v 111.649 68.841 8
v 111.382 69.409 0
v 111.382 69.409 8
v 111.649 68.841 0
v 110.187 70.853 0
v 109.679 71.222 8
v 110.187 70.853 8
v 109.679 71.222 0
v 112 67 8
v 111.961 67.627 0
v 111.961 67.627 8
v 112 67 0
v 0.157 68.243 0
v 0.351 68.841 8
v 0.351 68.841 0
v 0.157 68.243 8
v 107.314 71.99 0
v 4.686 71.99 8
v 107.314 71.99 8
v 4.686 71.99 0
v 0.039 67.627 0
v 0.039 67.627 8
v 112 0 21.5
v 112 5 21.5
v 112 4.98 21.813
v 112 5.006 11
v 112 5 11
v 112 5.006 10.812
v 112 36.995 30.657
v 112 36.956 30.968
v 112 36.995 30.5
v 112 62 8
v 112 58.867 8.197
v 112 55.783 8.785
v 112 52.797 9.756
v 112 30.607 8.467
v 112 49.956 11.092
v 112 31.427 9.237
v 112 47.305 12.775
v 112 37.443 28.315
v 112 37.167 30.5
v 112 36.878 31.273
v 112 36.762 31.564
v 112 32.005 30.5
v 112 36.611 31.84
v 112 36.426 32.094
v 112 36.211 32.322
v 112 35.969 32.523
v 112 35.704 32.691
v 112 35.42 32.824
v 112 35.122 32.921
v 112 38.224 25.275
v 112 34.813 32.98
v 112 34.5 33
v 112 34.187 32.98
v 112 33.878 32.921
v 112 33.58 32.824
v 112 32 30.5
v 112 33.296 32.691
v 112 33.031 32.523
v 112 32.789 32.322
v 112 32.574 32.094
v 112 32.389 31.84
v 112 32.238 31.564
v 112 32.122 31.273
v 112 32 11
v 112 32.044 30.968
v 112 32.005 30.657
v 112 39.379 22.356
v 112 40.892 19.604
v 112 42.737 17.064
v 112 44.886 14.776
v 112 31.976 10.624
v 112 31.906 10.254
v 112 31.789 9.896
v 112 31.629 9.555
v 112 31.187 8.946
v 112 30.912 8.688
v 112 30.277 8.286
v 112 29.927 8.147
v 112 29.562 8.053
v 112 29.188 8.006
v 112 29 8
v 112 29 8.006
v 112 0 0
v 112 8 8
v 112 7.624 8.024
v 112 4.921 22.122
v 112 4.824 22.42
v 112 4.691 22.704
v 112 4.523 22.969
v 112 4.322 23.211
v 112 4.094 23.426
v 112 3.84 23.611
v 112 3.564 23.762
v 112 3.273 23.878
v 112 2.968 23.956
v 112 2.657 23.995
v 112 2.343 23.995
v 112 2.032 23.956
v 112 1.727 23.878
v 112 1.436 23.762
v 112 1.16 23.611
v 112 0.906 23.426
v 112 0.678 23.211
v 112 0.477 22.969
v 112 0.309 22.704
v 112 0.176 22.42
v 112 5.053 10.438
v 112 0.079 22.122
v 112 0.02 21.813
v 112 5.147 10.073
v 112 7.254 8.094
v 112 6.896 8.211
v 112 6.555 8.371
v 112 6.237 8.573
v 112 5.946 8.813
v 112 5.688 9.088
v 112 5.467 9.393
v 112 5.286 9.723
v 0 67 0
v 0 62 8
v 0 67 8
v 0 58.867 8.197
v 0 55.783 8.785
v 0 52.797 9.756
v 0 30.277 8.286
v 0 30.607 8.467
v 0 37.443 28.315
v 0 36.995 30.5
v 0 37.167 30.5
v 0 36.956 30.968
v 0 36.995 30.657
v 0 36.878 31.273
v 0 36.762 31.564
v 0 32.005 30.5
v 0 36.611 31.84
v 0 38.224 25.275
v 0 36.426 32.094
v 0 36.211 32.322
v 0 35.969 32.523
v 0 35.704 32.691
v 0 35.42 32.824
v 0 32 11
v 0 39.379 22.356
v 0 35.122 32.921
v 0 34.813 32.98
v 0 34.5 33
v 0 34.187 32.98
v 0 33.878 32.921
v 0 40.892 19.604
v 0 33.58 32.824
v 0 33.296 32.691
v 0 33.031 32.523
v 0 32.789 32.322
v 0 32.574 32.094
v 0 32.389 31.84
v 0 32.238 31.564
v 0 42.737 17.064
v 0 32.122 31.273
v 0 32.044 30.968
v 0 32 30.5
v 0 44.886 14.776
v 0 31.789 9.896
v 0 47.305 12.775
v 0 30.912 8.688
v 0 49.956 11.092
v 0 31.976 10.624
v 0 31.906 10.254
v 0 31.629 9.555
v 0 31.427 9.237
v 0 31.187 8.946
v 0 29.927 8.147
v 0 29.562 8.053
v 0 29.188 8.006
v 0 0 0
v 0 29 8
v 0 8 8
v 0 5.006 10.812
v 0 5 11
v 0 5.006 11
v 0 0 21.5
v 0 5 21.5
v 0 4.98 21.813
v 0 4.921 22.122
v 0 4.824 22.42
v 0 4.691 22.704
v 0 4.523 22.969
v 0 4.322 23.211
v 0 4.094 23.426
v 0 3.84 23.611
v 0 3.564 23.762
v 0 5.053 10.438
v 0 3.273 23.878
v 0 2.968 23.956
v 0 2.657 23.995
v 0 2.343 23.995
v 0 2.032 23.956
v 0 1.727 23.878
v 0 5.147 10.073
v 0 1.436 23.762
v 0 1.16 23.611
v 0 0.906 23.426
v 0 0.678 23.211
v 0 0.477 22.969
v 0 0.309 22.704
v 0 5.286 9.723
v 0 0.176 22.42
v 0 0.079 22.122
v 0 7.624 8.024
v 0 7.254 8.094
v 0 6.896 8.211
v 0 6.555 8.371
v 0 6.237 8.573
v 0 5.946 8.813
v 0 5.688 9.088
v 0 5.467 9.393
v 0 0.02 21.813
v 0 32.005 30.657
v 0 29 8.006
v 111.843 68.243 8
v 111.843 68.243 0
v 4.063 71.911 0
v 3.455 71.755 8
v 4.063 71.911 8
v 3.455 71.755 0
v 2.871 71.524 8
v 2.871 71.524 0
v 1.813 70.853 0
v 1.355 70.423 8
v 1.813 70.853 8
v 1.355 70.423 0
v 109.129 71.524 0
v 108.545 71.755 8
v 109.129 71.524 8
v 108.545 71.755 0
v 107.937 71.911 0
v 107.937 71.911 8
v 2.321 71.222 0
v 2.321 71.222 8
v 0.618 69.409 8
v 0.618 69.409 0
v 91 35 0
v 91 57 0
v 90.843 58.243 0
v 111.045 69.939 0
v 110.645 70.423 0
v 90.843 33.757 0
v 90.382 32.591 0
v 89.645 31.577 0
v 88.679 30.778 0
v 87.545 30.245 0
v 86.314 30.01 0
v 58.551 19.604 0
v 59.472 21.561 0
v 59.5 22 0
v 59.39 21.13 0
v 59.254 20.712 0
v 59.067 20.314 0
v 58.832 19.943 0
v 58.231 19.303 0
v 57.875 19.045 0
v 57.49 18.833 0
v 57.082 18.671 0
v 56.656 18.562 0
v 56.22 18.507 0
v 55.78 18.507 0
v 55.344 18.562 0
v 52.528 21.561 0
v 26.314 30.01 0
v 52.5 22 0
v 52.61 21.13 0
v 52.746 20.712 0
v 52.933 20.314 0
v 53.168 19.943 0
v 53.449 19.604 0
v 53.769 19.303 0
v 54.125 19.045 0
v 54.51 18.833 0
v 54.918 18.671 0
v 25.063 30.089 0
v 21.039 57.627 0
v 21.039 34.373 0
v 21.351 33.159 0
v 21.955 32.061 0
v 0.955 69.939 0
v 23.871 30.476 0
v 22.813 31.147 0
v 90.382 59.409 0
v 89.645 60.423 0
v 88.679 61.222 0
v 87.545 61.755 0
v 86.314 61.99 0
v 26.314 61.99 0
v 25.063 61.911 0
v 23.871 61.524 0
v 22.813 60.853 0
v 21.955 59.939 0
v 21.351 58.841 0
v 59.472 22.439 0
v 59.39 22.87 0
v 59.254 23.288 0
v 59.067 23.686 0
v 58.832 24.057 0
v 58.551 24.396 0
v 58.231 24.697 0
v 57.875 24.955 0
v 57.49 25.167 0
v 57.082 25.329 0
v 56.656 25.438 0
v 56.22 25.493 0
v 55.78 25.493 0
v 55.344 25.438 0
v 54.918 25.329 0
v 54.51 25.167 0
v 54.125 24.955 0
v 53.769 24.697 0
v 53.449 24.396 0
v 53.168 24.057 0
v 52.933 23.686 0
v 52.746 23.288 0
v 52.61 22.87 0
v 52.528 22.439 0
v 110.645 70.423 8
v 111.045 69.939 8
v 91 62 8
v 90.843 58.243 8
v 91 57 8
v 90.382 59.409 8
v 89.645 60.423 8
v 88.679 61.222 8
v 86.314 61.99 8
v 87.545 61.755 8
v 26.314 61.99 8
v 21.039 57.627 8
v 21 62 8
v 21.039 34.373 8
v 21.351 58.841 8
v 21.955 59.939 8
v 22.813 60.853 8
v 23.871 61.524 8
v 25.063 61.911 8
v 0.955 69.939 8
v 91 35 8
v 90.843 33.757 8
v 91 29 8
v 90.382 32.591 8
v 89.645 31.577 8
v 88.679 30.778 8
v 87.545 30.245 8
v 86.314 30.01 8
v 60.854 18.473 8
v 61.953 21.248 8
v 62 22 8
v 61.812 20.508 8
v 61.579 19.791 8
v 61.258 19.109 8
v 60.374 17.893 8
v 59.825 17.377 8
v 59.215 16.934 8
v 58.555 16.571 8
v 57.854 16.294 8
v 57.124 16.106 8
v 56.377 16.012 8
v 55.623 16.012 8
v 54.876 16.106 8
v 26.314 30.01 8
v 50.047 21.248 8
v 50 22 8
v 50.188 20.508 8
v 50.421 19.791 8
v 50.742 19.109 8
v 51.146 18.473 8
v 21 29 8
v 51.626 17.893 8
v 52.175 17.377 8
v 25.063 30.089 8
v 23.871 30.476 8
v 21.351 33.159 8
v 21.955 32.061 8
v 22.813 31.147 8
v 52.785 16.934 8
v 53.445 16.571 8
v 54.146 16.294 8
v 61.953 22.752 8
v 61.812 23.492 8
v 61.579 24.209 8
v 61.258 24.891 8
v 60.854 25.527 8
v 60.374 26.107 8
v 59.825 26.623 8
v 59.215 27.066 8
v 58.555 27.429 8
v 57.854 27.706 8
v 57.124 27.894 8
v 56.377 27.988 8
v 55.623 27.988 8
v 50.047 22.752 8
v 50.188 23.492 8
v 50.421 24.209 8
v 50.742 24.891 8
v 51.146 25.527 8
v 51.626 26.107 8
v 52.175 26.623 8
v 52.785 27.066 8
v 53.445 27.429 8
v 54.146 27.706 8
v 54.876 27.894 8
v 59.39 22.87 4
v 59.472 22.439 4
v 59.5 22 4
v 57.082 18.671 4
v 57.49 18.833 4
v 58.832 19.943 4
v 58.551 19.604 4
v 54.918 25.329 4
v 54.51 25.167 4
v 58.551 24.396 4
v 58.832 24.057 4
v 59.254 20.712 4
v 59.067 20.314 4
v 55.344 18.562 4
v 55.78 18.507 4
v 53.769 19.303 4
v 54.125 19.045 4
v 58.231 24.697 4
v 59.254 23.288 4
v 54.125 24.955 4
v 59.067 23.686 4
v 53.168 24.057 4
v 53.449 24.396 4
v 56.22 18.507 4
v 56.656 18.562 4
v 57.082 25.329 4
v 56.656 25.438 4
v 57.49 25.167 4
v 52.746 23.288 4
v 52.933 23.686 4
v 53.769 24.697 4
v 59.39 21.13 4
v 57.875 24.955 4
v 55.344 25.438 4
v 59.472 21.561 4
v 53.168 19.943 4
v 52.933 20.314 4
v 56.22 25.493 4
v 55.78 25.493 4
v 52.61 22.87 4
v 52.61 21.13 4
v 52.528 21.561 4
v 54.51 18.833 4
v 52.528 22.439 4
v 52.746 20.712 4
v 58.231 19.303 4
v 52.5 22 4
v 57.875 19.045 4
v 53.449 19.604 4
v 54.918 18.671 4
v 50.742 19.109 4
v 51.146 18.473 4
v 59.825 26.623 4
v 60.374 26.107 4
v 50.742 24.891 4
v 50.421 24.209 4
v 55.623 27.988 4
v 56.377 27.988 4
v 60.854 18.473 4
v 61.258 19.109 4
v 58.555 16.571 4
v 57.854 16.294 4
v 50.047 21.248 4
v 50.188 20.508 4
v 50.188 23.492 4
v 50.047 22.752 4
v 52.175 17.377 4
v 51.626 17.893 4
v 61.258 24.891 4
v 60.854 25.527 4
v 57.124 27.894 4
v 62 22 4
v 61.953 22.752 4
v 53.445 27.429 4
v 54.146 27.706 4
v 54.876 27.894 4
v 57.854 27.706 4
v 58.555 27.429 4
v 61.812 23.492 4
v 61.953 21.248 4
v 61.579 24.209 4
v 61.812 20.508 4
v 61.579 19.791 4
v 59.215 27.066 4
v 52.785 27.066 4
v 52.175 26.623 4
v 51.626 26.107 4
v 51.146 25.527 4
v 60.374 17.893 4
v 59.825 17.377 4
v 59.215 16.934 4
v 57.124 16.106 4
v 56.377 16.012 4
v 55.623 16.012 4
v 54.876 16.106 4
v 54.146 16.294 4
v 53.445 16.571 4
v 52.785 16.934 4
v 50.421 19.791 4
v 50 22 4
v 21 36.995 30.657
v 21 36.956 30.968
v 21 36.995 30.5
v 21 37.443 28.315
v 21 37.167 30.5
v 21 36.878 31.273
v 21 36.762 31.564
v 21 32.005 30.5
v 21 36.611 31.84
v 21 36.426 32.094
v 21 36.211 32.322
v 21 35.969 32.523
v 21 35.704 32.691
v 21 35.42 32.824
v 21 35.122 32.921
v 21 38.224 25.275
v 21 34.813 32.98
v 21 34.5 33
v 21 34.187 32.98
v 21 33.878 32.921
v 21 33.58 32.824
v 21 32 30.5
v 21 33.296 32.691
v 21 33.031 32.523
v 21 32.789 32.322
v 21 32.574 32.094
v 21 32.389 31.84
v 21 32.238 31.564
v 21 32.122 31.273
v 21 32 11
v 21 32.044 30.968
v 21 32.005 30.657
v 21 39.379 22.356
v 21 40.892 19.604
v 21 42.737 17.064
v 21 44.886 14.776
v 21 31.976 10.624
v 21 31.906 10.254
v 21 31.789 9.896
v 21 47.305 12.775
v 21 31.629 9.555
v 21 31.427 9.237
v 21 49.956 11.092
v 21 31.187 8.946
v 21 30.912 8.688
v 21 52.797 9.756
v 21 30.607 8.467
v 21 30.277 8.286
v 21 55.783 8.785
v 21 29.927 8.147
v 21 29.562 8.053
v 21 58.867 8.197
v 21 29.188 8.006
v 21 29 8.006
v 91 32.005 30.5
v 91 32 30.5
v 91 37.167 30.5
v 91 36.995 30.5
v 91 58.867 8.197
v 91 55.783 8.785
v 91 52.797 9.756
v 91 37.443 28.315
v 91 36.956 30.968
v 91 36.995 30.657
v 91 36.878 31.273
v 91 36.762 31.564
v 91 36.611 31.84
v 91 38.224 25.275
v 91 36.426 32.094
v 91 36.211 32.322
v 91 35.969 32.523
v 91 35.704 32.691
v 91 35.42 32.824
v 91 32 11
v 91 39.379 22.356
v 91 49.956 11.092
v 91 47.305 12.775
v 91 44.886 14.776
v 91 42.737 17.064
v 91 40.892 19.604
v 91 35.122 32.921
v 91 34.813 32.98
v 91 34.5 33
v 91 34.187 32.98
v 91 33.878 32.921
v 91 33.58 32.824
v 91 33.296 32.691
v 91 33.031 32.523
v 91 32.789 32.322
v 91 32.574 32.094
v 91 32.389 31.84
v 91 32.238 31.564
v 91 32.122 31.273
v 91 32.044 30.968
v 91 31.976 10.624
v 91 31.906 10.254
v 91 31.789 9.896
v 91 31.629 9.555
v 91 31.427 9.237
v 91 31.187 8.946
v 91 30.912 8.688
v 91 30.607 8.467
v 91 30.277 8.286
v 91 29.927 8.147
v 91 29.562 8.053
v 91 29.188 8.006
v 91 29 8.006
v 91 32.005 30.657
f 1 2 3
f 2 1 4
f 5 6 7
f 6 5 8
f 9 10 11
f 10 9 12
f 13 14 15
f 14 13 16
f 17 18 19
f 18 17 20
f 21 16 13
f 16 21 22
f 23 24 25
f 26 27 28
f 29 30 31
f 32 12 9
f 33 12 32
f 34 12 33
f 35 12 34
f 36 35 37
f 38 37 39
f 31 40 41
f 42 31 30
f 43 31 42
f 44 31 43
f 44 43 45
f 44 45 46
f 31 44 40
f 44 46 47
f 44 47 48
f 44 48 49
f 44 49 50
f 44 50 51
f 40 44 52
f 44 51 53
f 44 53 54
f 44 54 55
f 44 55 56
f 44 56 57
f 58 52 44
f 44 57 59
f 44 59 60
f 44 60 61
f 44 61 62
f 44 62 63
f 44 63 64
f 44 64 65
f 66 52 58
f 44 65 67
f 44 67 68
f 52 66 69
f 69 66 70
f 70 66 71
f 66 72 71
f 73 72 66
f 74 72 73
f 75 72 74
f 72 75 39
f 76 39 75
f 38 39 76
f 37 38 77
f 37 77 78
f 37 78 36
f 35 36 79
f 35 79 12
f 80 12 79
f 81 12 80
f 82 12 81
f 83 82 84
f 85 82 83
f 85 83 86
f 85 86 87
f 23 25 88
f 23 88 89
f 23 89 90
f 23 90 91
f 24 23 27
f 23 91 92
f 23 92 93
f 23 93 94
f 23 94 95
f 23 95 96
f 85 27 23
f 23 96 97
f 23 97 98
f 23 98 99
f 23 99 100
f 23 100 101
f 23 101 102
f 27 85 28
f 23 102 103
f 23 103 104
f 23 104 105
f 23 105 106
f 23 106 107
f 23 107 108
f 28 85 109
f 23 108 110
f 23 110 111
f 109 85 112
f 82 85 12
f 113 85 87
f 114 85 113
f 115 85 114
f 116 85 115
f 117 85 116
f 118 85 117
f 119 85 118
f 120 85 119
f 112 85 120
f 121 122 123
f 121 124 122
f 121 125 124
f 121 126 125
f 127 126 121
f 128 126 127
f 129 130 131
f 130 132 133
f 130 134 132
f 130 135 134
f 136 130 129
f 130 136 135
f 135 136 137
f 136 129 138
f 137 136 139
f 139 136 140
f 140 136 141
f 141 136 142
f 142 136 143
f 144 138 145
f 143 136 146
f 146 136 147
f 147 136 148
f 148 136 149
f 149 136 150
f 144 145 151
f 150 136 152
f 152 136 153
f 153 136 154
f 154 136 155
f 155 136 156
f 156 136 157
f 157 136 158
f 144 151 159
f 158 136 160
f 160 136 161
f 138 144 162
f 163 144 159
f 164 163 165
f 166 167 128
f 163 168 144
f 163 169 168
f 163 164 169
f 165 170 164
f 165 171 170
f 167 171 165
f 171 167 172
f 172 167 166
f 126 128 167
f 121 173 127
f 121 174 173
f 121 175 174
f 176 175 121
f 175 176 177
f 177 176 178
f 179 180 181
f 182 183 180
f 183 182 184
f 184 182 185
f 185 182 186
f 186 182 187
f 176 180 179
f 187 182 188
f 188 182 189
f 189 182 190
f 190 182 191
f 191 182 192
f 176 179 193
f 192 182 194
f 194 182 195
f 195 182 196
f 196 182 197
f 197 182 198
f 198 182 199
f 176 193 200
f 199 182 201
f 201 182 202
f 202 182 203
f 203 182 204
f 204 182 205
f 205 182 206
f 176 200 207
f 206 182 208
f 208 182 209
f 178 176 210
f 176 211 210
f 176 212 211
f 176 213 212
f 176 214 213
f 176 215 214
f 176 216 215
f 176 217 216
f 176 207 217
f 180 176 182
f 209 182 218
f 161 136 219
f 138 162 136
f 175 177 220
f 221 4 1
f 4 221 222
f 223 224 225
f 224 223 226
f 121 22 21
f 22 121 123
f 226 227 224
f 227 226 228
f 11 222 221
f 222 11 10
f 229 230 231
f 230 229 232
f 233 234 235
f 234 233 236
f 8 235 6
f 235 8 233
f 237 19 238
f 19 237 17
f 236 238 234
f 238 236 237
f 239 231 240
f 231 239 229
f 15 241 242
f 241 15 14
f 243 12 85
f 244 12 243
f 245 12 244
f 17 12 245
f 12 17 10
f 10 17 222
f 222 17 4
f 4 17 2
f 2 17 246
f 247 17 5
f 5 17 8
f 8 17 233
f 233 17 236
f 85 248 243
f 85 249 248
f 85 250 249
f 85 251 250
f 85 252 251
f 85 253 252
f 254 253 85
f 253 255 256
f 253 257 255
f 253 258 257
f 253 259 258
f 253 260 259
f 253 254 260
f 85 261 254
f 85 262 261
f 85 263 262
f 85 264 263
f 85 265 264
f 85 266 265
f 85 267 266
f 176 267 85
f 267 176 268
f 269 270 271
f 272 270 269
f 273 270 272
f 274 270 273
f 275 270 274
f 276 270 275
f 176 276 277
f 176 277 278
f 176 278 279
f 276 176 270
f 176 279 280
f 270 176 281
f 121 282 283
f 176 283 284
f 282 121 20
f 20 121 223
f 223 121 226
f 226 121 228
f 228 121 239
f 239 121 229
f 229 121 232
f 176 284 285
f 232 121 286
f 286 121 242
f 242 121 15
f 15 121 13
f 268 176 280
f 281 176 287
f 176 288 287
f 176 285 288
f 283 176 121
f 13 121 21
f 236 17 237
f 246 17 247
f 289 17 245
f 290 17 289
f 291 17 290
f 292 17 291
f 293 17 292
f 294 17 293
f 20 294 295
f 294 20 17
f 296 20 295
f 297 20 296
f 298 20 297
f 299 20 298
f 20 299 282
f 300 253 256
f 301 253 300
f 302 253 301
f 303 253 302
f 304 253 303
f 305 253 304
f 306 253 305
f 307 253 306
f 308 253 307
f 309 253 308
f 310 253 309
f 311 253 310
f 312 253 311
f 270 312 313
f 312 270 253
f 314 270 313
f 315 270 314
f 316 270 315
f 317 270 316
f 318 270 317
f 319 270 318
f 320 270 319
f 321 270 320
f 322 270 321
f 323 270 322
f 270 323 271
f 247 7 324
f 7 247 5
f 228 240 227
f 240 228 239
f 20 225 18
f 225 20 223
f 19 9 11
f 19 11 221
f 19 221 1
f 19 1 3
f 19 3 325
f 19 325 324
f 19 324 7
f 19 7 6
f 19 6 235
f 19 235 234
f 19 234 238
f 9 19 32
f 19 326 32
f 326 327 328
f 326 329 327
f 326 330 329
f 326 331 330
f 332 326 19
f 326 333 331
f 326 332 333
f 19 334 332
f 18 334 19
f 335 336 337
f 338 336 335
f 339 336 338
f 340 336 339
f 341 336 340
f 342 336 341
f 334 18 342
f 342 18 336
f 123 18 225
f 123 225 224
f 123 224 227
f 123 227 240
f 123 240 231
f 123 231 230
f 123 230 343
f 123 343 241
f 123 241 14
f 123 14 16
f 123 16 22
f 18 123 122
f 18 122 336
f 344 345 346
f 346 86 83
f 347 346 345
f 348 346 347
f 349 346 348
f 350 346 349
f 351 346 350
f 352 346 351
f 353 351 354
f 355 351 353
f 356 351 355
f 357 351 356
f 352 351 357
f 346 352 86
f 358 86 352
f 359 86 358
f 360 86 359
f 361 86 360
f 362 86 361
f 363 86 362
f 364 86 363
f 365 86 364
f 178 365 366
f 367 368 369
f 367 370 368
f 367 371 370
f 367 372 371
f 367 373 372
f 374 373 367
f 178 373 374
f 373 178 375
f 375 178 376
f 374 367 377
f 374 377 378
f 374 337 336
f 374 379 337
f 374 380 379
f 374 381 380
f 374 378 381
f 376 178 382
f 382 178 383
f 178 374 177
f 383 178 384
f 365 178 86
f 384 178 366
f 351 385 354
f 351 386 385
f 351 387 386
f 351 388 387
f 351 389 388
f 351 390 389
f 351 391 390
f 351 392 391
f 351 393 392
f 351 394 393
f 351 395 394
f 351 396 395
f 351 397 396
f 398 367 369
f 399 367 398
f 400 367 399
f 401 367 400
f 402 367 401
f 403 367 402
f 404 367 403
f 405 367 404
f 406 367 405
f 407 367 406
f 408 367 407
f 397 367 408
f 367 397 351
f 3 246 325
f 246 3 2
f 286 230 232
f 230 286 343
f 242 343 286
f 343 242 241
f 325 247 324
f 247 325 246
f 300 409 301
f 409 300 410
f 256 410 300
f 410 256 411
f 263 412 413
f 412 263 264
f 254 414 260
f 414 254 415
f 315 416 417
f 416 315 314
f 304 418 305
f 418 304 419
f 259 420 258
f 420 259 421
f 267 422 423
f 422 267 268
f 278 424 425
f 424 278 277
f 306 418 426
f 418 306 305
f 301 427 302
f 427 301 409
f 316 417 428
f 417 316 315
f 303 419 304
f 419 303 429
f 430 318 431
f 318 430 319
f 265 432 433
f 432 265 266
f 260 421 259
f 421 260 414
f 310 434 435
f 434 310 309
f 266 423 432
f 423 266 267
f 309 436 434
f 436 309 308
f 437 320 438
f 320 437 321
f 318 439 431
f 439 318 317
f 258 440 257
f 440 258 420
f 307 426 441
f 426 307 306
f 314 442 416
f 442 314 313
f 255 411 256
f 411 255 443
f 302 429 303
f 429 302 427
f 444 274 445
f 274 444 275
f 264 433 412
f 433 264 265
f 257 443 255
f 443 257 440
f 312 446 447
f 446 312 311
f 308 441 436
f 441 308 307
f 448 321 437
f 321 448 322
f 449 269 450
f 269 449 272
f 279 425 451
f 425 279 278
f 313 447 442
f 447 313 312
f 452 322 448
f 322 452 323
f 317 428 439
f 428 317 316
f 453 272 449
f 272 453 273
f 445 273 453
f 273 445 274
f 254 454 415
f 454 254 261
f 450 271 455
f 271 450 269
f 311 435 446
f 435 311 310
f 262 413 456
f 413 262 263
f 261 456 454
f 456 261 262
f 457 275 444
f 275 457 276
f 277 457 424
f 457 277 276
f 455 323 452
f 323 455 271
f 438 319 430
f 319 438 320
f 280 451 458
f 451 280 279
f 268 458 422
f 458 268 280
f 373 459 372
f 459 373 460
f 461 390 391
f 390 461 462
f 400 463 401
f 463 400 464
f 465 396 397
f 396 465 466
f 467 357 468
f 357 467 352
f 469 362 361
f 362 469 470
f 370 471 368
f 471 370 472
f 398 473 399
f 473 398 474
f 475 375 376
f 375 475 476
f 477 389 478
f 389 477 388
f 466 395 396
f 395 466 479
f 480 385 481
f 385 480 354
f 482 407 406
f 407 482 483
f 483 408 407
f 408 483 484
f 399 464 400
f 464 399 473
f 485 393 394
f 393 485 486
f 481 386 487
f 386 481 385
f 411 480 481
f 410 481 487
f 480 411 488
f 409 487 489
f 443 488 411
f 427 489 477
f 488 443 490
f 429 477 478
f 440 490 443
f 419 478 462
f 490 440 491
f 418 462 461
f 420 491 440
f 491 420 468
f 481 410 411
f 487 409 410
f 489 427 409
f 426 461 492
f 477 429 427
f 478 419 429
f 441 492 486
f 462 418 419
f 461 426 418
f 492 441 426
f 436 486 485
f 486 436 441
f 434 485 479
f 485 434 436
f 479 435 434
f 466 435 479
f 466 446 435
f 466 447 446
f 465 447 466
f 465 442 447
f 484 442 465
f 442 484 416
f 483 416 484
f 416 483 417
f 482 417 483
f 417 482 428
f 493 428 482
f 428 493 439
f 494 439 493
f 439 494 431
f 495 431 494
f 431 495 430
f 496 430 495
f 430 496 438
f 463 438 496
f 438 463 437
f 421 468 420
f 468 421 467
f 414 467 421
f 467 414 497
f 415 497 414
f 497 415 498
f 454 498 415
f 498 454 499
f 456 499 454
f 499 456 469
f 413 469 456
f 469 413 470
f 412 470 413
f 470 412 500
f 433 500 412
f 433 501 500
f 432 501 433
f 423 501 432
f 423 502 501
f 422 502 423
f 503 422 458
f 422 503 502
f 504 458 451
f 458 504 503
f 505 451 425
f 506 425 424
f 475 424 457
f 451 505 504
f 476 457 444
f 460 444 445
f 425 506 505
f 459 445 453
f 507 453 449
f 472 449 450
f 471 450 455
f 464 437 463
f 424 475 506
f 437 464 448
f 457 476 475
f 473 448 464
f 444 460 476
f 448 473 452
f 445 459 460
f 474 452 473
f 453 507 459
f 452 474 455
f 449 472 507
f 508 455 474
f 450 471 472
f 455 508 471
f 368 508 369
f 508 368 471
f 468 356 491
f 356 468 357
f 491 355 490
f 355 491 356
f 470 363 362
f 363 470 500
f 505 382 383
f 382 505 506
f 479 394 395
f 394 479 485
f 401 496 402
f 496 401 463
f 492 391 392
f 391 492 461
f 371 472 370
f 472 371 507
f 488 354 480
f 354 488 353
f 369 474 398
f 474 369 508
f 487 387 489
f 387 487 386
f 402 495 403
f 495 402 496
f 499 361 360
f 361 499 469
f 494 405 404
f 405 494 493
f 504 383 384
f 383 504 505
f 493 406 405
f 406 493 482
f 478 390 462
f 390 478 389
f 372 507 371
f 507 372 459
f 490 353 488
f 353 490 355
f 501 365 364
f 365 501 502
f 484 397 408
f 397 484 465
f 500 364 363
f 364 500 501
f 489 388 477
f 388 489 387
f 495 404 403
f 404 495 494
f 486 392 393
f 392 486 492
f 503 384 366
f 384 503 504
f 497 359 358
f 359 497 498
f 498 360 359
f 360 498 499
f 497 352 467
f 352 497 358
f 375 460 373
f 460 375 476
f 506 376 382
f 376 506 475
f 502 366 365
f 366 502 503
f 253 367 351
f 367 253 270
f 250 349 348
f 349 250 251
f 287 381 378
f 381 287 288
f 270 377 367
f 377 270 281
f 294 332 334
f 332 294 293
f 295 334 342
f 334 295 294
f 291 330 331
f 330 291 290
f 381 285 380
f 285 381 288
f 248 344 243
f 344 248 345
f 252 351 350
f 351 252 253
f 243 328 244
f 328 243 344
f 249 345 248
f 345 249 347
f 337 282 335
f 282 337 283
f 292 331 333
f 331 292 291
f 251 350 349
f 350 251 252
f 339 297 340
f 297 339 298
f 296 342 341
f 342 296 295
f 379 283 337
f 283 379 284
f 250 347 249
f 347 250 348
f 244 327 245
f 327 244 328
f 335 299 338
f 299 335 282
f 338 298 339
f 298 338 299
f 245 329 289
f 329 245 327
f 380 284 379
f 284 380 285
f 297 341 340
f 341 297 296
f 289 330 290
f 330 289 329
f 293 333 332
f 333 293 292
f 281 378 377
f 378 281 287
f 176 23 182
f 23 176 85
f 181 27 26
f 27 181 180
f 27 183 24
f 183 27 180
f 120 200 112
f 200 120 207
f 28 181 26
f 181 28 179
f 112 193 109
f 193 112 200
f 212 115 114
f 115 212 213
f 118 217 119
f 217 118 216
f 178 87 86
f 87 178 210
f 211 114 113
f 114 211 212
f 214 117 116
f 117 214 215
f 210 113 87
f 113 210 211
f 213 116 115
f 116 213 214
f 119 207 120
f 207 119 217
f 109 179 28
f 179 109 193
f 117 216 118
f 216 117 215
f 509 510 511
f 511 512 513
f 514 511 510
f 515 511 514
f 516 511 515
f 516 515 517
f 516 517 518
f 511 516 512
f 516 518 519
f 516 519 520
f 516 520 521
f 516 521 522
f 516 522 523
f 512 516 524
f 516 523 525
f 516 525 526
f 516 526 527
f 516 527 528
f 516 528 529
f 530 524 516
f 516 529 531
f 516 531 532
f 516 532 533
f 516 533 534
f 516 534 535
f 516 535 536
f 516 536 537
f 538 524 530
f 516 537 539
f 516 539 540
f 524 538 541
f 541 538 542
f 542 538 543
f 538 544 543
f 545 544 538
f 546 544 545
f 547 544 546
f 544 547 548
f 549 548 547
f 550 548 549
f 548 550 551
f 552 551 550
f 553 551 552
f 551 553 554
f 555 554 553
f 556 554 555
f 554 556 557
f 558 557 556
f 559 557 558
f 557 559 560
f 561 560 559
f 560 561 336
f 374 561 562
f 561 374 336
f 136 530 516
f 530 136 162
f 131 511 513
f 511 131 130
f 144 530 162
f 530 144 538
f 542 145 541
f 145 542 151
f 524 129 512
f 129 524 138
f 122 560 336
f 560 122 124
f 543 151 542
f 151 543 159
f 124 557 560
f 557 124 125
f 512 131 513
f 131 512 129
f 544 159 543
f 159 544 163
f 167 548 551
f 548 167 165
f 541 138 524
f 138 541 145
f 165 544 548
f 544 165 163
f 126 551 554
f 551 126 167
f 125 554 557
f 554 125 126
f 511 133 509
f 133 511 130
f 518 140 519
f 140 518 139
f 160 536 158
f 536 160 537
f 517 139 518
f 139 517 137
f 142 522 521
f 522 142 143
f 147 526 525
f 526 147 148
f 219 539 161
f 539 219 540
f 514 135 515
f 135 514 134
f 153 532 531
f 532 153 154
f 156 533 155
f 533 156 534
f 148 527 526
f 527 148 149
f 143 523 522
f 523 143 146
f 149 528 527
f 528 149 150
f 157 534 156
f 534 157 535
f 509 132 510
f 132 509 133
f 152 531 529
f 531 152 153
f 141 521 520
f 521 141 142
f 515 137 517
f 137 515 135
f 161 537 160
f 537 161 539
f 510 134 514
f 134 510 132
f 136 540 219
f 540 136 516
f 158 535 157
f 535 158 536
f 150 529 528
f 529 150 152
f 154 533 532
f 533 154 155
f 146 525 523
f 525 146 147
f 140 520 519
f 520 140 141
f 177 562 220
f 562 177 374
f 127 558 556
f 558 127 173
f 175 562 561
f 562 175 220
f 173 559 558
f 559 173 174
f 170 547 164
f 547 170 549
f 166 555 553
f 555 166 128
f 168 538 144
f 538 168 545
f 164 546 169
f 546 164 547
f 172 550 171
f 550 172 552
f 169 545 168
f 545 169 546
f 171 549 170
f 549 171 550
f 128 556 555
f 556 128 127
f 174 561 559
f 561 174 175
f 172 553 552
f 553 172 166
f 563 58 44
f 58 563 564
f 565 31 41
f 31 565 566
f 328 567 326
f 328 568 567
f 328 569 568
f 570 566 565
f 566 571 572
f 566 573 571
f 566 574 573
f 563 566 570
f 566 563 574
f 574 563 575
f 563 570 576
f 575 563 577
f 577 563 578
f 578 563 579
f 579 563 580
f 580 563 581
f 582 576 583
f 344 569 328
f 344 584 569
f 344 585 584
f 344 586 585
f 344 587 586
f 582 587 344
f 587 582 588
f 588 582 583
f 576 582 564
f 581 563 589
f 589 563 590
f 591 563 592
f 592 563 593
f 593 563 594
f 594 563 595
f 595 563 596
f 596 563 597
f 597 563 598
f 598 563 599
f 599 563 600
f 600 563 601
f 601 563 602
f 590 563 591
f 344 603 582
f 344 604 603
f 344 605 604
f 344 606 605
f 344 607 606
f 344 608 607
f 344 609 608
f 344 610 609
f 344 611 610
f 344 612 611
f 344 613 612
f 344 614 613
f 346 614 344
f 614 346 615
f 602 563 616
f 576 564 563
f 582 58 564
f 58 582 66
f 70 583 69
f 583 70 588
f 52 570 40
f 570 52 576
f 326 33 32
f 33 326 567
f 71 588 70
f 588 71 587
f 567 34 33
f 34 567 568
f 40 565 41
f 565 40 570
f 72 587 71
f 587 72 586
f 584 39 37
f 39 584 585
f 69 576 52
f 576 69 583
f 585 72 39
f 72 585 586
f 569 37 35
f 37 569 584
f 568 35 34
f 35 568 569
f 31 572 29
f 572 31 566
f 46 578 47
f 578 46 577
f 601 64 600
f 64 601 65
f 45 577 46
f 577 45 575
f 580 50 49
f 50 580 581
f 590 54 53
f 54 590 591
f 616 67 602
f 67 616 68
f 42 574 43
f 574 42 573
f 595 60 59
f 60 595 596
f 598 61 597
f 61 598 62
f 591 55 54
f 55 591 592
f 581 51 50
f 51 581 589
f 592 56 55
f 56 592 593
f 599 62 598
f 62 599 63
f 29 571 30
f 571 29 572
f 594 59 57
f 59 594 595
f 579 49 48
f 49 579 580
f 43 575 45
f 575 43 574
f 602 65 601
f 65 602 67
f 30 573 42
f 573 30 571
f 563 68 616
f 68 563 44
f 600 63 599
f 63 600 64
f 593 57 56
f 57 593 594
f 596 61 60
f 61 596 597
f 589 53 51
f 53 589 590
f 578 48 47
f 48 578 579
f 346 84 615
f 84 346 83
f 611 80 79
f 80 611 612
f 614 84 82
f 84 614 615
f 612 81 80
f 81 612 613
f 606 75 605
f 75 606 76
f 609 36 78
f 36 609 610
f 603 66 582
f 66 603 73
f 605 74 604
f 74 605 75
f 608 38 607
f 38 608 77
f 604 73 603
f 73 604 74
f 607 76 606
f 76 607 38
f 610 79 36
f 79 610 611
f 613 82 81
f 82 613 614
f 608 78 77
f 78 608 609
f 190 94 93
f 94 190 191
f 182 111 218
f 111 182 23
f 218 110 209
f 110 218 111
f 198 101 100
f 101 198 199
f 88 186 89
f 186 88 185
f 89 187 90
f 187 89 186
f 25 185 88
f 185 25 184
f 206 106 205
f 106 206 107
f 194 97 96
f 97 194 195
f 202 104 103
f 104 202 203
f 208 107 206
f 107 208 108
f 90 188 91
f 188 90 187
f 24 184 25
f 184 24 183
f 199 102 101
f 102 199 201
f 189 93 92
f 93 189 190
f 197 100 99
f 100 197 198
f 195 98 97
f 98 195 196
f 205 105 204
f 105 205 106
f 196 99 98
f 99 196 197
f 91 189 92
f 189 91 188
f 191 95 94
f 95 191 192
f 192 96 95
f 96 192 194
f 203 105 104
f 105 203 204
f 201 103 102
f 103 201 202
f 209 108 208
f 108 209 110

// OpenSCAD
$fn=50;
base_thickness=8;
clamp_thickness=5;
front_clamp_height=16;
clamp_back_height=25;
clamp_gap=27;
clamp_inner_cornice_radius=3;

base(base_thickness);

//Front Clamp
rotate([90,0,90])
    roundedCube([clamp_thickness,front_clamp_height+base_thickness,112],clamp_thickness/2);
translate([0,clamp_thickness,base_thickness])
    cornice(clamp_inner_cornice_radius,112);


//back clamp
translate([0,clamp_gap+clamp_thickness,base_thickness])
    clamp_back(clamp_back_height, clamp_thickness,21);
translate([0,clamp_thickness+clamp_gap,base_thickness])
    rotate([90])
        cornice(clamp_inner_cornice_radius,21);
//back clamp
translate([112-21,clamp_gap+clamp_thickness,base_thickness])
    clamp_back(clamp_back_height, clamp_thickness,21);
translate([112-21,clamp_thickness+clamp_gap,base_thickness])
    rotate([90])
        cornice(clamp_inner_cornice_radius,21);


module base(thickness){
    difference(){
            roundedCube([112, 72, thickness], 5);
            translate([56,22,0])cylinder(thickness,3.5,3.5);
            translate([56,22,thickness/2])cylinder(thickness,6,6);
            translate([21,30,0])roundedCube([70,32,thickness],5,$fn=25);
    }
    cube([112,thickness,thickness]);
}

module roundedCube(size, r)
{
	x = size[0];
	y = size[1];
	z = size[2];

    hull(){
        translate([r, r, 0]) cylinder(z,r, r);
        translate([x-r, r, 0]) cylinder(z,r, r);
        translate([r, y-r, 0]) cylinder(z,r, r);
        translate([x-r, y-r, 0]) cylinder(z,r, r);
    }
}

module cornice(radius, length){
    
    difference(){
        cube([length, radius, radius]);
        translate([0,radius,radius])rotate([0,90,0])cylinder(length, radius, radius);
    }
    
    
}

module clamp_back(height, thickness, width){
    
    difference(){
        cube([width, height+thickness,height-(thickness/2)]);
        translate([0,height+thickness,height])rotate([0,90,0])cylinder(width, height, height);
    }
    translate([0,thickness/2,height-(thickness/2)])rotate([0,90,0])cylinder(width,thickness/2,thickness/2);
    
}
